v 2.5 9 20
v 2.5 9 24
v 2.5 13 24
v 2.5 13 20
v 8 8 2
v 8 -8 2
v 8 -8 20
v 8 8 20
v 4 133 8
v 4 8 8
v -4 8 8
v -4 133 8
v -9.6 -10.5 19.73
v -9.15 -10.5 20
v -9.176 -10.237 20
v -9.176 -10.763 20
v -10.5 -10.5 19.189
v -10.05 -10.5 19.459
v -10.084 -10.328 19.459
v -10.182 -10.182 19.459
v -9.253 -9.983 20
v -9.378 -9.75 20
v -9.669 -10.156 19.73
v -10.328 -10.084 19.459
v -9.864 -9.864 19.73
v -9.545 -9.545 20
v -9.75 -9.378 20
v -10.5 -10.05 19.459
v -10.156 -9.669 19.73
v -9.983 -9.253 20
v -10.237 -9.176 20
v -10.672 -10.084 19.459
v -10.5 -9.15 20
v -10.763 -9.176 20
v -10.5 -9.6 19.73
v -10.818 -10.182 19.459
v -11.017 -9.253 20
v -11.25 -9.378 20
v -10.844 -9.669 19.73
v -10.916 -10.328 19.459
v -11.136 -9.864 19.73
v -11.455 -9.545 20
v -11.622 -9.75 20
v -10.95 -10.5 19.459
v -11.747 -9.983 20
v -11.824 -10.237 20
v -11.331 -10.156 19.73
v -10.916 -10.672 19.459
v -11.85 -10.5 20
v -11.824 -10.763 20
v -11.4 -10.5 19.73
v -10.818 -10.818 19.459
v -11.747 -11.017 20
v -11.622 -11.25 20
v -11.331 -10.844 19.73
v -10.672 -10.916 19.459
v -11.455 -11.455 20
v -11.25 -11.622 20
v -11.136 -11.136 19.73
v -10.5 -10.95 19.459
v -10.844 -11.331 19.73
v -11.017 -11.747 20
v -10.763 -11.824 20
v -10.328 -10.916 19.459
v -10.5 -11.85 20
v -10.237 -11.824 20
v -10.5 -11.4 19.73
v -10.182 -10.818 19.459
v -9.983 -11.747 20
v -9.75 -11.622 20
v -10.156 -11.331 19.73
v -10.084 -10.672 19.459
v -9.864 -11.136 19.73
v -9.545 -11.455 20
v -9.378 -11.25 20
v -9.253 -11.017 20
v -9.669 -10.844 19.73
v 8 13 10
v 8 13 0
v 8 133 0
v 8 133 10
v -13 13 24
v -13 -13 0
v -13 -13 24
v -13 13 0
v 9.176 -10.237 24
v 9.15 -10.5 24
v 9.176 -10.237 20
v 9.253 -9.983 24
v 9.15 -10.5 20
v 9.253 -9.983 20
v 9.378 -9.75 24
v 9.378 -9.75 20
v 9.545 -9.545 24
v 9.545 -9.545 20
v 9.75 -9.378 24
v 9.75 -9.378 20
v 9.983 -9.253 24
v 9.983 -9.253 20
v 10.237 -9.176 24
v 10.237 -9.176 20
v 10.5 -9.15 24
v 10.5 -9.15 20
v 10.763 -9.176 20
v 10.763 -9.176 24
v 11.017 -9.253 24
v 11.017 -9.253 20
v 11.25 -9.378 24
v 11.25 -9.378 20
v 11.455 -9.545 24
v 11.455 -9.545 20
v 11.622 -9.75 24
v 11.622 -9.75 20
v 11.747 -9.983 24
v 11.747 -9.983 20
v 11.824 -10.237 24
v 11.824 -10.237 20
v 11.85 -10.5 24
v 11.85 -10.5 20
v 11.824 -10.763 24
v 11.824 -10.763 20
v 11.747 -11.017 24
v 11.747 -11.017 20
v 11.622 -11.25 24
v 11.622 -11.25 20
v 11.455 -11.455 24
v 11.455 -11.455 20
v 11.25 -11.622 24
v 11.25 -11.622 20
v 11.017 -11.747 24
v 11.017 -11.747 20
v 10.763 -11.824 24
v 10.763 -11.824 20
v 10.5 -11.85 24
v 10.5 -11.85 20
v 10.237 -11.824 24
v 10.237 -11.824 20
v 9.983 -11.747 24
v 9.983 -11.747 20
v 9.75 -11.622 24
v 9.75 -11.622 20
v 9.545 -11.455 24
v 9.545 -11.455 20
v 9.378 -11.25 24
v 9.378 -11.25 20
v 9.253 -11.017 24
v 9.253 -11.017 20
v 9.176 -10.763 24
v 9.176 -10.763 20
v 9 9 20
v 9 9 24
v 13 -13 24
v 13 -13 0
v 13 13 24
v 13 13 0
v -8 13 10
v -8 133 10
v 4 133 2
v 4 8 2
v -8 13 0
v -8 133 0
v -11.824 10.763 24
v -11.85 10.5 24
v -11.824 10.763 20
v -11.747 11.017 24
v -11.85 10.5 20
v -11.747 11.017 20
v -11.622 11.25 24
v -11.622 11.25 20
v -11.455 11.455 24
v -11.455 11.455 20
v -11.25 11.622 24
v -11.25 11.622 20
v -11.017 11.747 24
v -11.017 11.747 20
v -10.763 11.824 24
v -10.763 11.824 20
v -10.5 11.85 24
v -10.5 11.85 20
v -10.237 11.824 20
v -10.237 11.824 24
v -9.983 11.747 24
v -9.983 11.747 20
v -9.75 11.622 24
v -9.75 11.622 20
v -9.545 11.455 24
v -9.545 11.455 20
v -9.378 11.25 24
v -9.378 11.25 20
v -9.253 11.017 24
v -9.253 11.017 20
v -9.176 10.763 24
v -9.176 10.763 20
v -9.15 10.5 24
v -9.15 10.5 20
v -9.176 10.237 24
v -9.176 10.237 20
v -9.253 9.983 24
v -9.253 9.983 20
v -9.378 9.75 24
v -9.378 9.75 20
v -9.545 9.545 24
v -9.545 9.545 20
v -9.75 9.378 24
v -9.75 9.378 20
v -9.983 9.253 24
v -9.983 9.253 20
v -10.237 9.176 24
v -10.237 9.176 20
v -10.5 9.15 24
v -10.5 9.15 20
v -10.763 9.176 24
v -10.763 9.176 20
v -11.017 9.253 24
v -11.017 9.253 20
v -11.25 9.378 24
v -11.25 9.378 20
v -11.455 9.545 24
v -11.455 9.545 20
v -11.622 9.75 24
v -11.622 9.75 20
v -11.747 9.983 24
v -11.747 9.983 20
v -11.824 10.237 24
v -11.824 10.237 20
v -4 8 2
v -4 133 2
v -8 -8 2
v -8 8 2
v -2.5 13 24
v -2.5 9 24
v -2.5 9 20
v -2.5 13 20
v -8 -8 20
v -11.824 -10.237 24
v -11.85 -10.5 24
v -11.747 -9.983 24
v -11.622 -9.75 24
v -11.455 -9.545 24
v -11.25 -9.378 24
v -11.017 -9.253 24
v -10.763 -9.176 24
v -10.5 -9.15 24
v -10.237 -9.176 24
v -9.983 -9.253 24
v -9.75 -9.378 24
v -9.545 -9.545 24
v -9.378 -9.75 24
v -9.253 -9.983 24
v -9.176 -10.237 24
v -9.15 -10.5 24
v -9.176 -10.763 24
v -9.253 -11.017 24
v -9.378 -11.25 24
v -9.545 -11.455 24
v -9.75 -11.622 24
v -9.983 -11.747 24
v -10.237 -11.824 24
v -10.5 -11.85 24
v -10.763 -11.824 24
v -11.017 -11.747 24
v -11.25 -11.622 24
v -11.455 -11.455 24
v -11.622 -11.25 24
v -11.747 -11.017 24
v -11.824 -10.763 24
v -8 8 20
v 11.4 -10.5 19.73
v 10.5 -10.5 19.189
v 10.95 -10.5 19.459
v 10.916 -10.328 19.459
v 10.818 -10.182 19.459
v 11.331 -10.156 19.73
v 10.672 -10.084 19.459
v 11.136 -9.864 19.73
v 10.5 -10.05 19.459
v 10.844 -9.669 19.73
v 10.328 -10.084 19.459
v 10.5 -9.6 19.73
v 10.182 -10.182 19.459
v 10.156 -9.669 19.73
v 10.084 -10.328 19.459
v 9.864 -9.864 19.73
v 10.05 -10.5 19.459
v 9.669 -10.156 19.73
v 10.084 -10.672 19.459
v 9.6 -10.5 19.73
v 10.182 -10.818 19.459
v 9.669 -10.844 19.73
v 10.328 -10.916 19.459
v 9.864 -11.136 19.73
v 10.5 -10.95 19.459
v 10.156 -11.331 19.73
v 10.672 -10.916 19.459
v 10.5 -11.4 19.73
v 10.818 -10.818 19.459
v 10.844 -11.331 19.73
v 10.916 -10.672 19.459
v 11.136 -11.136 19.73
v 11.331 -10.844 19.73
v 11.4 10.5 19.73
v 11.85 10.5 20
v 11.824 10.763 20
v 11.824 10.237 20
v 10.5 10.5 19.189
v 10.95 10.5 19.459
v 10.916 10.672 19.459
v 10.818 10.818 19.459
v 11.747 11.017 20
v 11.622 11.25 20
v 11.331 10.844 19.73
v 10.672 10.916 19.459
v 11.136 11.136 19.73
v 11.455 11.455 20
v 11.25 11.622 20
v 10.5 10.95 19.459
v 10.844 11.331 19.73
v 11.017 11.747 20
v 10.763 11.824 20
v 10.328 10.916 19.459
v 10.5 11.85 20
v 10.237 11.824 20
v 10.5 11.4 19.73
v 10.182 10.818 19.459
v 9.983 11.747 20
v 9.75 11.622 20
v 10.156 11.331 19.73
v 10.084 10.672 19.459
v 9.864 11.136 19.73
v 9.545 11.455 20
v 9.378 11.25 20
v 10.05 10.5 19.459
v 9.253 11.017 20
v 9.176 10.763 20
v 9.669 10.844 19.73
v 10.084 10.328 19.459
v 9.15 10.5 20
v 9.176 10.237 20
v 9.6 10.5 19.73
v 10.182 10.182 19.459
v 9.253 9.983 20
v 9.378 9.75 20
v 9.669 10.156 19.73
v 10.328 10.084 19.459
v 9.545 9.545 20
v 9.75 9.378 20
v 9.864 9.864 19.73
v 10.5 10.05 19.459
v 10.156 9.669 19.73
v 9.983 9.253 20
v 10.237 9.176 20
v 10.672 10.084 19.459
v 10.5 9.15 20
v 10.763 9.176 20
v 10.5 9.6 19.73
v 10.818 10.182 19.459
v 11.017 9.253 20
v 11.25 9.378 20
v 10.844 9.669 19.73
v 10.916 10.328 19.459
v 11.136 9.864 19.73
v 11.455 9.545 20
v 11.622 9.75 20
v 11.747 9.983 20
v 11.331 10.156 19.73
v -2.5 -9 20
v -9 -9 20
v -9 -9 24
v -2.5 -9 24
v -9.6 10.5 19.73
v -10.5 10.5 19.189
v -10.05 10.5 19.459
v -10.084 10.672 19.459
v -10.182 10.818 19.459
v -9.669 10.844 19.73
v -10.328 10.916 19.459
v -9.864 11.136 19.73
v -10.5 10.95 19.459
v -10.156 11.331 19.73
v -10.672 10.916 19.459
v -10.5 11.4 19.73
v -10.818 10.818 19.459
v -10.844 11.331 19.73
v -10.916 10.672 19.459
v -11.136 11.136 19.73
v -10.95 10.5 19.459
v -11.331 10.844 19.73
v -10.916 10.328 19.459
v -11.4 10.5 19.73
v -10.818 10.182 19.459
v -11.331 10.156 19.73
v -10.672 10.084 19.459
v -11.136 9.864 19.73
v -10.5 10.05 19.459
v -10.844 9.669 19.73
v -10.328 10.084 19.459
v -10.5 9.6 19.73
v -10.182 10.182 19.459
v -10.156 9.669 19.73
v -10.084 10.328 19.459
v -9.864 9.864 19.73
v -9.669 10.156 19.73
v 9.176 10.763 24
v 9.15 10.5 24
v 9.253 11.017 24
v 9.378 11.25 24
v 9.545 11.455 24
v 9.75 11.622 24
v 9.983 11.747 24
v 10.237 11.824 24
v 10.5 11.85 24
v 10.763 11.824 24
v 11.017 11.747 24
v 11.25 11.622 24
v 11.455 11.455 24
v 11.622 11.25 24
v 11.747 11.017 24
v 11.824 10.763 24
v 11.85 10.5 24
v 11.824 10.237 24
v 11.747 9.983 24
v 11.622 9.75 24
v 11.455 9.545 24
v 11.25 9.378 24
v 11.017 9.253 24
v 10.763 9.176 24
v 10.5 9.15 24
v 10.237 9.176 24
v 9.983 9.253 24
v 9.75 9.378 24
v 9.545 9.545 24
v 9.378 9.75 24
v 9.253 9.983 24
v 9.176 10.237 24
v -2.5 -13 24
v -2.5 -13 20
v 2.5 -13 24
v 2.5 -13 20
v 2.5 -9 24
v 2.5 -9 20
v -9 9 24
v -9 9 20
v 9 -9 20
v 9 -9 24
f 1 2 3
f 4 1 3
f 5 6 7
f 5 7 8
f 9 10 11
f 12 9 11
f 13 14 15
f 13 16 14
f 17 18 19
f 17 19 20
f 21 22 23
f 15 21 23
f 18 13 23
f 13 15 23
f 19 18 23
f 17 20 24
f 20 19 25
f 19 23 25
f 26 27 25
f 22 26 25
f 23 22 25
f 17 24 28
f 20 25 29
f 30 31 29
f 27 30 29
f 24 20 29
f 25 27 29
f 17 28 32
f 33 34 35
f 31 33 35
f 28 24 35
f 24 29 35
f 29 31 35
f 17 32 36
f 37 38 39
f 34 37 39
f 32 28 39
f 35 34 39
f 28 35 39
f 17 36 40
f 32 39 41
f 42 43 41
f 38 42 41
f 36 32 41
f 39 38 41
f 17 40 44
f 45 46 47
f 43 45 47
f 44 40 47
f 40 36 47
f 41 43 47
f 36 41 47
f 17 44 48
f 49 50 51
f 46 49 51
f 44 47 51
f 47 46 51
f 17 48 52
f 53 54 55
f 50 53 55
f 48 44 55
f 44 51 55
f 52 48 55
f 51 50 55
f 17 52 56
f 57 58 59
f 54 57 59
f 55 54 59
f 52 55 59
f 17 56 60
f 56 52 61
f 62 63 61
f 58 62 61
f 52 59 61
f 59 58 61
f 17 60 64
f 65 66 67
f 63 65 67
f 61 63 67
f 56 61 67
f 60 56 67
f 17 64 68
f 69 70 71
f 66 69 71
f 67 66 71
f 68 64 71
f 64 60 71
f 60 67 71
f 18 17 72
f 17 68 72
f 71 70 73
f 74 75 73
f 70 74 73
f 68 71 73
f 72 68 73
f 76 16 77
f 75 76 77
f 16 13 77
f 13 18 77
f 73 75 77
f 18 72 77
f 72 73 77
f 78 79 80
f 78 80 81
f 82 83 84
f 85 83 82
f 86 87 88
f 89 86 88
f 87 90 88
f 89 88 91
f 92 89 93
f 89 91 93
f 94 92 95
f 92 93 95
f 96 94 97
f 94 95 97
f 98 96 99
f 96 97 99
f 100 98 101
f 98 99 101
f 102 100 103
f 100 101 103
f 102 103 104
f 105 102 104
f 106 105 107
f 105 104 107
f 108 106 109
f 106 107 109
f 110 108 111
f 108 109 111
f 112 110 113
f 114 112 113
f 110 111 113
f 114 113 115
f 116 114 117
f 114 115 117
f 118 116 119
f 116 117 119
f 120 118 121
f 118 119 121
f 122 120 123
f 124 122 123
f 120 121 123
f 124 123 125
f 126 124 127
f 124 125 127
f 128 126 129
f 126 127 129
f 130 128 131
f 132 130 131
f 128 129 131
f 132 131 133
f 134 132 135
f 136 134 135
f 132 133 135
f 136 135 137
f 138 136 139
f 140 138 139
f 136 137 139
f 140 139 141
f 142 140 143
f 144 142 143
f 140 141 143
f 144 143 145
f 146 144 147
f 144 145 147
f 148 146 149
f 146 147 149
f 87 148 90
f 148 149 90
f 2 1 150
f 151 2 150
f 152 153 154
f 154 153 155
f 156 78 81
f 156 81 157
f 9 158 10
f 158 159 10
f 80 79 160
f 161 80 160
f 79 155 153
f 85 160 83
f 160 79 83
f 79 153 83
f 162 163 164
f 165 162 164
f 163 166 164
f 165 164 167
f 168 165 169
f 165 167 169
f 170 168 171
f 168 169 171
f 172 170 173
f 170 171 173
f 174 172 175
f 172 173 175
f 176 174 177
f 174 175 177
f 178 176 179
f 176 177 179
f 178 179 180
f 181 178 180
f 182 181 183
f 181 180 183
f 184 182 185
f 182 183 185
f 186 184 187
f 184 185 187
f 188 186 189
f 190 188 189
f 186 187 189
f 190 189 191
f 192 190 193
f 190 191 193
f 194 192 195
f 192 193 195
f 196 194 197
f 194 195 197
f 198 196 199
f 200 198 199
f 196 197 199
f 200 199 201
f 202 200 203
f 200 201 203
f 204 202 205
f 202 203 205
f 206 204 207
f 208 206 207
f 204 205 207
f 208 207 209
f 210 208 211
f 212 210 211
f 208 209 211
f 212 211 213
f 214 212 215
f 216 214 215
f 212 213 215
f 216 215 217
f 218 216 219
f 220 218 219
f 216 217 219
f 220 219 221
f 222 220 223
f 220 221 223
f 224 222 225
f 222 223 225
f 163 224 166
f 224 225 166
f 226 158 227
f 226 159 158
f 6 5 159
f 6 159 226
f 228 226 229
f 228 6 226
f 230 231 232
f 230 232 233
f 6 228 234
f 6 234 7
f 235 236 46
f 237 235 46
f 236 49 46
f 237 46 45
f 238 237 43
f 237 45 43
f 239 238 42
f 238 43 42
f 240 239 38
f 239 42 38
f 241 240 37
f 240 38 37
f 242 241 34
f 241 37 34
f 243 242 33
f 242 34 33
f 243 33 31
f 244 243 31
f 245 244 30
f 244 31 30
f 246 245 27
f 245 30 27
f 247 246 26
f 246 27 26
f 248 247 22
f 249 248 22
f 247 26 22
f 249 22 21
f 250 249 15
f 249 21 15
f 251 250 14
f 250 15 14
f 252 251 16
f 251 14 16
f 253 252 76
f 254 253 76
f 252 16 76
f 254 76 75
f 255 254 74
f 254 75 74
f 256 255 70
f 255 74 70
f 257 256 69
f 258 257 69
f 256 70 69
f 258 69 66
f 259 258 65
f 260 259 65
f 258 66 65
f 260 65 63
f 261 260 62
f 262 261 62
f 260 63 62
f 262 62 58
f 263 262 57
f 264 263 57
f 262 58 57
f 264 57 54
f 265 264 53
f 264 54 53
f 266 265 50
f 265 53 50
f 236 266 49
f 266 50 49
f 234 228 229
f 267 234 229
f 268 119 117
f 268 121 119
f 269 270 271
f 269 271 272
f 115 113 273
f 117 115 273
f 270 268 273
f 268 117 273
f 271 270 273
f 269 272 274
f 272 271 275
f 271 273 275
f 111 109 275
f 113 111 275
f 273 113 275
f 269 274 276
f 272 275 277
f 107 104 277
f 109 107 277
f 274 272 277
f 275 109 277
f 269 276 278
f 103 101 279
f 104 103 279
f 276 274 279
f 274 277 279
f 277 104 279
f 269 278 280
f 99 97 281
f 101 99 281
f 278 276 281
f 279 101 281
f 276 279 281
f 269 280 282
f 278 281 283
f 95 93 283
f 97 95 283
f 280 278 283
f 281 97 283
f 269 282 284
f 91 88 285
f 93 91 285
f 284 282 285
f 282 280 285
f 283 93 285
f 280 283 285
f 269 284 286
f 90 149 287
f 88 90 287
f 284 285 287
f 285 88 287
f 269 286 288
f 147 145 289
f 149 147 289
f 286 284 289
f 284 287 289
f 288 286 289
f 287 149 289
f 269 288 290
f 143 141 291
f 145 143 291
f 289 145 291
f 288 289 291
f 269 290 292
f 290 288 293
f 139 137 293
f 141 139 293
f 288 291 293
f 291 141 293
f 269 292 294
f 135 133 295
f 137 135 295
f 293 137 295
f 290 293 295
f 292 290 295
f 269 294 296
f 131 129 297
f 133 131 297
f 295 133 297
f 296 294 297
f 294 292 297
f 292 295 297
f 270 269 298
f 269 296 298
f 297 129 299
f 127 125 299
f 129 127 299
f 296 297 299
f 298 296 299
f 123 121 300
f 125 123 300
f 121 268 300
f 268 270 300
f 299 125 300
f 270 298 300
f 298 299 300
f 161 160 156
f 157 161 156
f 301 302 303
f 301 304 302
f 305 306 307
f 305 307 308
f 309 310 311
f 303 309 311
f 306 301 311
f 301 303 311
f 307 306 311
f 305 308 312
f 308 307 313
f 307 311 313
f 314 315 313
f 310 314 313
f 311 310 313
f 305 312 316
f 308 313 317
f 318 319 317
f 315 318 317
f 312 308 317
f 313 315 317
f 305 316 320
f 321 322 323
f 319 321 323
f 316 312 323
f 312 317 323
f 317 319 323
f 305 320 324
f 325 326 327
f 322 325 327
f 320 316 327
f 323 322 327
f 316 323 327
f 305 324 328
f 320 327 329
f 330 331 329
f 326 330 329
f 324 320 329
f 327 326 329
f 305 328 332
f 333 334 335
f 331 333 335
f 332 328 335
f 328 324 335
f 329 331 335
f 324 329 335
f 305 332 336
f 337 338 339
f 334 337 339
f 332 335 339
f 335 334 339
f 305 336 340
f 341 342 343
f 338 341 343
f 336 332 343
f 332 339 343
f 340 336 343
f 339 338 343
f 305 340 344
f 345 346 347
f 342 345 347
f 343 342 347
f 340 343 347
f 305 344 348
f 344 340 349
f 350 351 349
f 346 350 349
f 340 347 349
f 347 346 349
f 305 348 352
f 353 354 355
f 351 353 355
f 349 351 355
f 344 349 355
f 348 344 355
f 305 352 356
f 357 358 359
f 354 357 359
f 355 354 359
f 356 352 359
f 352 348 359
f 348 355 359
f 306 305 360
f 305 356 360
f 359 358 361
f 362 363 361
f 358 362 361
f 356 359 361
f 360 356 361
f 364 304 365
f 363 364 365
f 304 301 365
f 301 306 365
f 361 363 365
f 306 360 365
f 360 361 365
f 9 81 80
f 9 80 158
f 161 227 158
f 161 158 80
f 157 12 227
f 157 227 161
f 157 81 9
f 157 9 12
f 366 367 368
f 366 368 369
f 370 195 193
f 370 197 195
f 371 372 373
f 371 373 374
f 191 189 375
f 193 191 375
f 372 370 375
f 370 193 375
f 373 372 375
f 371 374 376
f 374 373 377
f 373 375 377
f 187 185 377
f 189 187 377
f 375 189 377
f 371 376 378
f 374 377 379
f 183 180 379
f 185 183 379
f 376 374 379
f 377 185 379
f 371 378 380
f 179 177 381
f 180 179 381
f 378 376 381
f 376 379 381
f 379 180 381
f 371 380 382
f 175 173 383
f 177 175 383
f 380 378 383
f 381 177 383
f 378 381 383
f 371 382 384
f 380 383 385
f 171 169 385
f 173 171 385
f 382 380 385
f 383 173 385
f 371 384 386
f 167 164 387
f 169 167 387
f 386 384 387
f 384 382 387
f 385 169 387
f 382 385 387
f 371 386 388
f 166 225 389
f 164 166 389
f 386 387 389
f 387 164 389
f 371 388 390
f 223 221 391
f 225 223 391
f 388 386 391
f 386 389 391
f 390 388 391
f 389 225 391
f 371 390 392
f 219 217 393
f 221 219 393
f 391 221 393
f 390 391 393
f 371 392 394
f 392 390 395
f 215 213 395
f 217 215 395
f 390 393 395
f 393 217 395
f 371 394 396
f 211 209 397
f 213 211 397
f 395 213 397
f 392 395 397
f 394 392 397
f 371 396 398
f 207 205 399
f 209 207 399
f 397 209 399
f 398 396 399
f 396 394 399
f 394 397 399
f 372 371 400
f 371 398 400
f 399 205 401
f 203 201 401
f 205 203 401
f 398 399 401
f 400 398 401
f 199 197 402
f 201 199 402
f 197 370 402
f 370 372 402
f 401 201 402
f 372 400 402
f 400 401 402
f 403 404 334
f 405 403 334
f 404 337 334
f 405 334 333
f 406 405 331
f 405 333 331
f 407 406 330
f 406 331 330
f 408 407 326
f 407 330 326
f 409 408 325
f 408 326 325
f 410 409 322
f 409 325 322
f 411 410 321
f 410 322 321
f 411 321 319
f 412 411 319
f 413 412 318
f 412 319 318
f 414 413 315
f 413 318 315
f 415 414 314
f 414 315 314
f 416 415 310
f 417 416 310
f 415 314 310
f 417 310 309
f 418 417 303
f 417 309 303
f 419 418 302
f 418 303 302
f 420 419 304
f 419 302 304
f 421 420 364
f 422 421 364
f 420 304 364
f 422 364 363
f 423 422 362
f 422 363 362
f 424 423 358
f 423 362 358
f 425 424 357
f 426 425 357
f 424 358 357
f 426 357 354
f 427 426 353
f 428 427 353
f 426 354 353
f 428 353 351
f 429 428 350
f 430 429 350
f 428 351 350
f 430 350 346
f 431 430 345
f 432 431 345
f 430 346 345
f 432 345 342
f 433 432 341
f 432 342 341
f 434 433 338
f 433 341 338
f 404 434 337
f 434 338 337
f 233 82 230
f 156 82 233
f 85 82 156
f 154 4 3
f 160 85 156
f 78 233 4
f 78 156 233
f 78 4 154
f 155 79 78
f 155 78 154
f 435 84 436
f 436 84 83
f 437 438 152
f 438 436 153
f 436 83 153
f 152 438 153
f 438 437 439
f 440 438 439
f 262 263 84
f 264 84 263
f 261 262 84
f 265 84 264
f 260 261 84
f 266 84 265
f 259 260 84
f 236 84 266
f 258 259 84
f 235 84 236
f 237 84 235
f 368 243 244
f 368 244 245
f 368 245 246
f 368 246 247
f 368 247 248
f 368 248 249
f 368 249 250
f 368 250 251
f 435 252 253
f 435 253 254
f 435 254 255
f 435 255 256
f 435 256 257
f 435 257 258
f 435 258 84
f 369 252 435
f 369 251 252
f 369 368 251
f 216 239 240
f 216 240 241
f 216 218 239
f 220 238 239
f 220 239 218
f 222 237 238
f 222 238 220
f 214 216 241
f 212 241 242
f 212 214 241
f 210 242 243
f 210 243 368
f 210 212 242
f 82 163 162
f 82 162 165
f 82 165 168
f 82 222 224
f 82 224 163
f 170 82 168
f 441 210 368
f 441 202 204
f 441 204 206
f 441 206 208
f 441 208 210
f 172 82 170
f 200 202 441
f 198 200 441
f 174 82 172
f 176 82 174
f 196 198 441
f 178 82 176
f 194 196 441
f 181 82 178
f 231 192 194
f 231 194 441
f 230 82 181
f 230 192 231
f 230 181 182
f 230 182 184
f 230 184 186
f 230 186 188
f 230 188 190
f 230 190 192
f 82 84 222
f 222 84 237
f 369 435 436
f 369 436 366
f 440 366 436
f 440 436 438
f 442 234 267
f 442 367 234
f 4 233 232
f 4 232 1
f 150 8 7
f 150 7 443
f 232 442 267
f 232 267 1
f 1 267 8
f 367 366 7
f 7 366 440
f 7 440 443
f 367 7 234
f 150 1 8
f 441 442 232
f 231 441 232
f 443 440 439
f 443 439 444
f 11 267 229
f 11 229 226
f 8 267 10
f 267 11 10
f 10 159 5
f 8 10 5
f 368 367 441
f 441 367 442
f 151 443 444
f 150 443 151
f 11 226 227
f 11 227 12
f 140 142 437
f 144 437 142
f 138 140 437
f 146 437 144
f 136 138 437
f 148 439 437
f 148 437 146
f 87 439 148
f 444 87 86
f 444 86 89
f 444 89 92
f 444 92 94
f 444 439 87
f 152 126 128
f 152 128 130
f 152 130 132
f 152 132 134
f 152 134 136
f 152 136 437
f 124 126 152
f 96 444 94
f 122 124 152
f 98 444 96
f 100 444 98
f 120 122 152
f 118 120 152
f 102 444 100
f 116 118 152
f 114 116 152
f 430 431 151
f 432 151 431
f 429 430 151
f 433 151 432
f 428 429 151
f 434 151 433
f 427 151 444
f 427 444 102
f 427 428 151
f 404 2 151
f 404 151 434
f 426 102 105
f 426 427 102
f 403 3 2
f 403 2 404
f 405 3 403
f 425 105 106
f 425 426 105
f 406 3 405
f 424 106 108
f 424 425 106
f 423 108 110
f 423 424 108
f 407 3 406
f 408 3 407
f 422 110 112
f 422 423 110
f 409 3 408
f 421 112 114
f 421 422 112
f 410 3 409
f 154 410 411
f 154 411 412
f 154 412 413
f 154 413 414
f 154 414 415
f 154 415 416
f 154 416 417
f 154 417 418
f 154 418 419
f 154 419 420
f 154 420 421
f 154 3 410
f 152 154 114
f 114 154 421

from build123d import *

# Parameters (mm, degrees)
F0_W      = 26
F0_H      = 26
F0_W_2    = 16
F0_H_2    = 16
F1_DEPTH  = 2
F2_DEPTH  = 20
F3_W      = 26
F3_H      = 26
F3_W_2    = 18
F3_H_2    = 18
F4_DEPTH  = 4
F5_W      = 5
F5_H      = 4
F6_DEPTH  = 4
F7_D      = 2.7
F7_DEPTH  = 4
F7_TIP    = 0.8111618357
F9_W      = 8
F9_H      = 6
F10_DEPTH = 10.28
F9_W_2    = 16
F9_H_2    = 10
F11_DEPTH = 120


with BuildPart() as f1:
    # F0 (on Top) → F1 (new body)
    with BuildSketch(Plane.XY):
        Rectangle(F0_W, F0_H)
        Rectangle(F0_W_2, F0_H_2, mode=Mode.SUBTRACT)
        Rectangle(F0_W_2, F0_H_2)
    extrude(amount=F1_DEPTH)

    # F0 (on Top) → F2 (join)
    with BuildSketch(Plane.XY):
        Rectangle(F0_W, F0_H)
        Rectangle(F0_W_2, F0_H_2, mode=Mode.SUBTRACT)
    extrude(amount=F2_DEPTH)

    # F3 (on face) → F4 (join)
    with BuildSketch(Plane.XY.offset(20)):
        Rectangle(F3_W, F3_H)
        Rectangle(F3_W_2, F3_H_2, mode=Mode.SUBTRACT)
    extrude(amount=F4_DEPTH)

    # F5 (on face) → F6 (cut, through all)
    with BuildSketch(Plane.XY.offset(24)):
        with Locations((0, -11)):
            Rectangle(F5_W, F5_H)
        with Locations((0, 11)):
            Rectangle(F5_W, F5_H)
    extrude(amount=-F6_DEPTH, mode=Mode.SUBTRACT)

    # F7
    with Locations(Plane.XY.offset(24)):
        with Locations((-10.5, 10.5), (10.5, 10.5), (-10.5, -10.5), (10.5, -10.5)):
            Hole(F7_D / 2, depth=F7_DEPTH)
            with Locations((0, 0, -(F7_DEPTH + F7_TIP / 2))):  # 118° drill point
                Cone(0, F7_D / 2, F7_TIP, mode=Mode.SUBTRACT)

    # F9 (on face) → F10 (cut)
    with BuildSketch(Plane(origin=(0, 13, 0), x_dir=(-1, 0, 0), z_dir=(0, 1, 0))):
        with Locations((0, 5)):
            Rectangle(F9_W, F9_H)
    extrude(amount=-F10_DEPTH, mode=Mode.SUBTRACT)

    # F9 (on face) → F11 (join)
    with BuildSketch(Plane(origin=(0, 13, 0), x_dir=(-1, 0, 0), z_dir=(0, 1, 0))):
        with Locations((0, 5)):
            Rectangle(F9_W_2, F9_H_2)
        with Locations((0, 5)):
            Rectangle(F9_W, F9_H, mode=Mode.SUBTRACT)
    extrude(amount=F11_DEPTH)


solid = f1.part
